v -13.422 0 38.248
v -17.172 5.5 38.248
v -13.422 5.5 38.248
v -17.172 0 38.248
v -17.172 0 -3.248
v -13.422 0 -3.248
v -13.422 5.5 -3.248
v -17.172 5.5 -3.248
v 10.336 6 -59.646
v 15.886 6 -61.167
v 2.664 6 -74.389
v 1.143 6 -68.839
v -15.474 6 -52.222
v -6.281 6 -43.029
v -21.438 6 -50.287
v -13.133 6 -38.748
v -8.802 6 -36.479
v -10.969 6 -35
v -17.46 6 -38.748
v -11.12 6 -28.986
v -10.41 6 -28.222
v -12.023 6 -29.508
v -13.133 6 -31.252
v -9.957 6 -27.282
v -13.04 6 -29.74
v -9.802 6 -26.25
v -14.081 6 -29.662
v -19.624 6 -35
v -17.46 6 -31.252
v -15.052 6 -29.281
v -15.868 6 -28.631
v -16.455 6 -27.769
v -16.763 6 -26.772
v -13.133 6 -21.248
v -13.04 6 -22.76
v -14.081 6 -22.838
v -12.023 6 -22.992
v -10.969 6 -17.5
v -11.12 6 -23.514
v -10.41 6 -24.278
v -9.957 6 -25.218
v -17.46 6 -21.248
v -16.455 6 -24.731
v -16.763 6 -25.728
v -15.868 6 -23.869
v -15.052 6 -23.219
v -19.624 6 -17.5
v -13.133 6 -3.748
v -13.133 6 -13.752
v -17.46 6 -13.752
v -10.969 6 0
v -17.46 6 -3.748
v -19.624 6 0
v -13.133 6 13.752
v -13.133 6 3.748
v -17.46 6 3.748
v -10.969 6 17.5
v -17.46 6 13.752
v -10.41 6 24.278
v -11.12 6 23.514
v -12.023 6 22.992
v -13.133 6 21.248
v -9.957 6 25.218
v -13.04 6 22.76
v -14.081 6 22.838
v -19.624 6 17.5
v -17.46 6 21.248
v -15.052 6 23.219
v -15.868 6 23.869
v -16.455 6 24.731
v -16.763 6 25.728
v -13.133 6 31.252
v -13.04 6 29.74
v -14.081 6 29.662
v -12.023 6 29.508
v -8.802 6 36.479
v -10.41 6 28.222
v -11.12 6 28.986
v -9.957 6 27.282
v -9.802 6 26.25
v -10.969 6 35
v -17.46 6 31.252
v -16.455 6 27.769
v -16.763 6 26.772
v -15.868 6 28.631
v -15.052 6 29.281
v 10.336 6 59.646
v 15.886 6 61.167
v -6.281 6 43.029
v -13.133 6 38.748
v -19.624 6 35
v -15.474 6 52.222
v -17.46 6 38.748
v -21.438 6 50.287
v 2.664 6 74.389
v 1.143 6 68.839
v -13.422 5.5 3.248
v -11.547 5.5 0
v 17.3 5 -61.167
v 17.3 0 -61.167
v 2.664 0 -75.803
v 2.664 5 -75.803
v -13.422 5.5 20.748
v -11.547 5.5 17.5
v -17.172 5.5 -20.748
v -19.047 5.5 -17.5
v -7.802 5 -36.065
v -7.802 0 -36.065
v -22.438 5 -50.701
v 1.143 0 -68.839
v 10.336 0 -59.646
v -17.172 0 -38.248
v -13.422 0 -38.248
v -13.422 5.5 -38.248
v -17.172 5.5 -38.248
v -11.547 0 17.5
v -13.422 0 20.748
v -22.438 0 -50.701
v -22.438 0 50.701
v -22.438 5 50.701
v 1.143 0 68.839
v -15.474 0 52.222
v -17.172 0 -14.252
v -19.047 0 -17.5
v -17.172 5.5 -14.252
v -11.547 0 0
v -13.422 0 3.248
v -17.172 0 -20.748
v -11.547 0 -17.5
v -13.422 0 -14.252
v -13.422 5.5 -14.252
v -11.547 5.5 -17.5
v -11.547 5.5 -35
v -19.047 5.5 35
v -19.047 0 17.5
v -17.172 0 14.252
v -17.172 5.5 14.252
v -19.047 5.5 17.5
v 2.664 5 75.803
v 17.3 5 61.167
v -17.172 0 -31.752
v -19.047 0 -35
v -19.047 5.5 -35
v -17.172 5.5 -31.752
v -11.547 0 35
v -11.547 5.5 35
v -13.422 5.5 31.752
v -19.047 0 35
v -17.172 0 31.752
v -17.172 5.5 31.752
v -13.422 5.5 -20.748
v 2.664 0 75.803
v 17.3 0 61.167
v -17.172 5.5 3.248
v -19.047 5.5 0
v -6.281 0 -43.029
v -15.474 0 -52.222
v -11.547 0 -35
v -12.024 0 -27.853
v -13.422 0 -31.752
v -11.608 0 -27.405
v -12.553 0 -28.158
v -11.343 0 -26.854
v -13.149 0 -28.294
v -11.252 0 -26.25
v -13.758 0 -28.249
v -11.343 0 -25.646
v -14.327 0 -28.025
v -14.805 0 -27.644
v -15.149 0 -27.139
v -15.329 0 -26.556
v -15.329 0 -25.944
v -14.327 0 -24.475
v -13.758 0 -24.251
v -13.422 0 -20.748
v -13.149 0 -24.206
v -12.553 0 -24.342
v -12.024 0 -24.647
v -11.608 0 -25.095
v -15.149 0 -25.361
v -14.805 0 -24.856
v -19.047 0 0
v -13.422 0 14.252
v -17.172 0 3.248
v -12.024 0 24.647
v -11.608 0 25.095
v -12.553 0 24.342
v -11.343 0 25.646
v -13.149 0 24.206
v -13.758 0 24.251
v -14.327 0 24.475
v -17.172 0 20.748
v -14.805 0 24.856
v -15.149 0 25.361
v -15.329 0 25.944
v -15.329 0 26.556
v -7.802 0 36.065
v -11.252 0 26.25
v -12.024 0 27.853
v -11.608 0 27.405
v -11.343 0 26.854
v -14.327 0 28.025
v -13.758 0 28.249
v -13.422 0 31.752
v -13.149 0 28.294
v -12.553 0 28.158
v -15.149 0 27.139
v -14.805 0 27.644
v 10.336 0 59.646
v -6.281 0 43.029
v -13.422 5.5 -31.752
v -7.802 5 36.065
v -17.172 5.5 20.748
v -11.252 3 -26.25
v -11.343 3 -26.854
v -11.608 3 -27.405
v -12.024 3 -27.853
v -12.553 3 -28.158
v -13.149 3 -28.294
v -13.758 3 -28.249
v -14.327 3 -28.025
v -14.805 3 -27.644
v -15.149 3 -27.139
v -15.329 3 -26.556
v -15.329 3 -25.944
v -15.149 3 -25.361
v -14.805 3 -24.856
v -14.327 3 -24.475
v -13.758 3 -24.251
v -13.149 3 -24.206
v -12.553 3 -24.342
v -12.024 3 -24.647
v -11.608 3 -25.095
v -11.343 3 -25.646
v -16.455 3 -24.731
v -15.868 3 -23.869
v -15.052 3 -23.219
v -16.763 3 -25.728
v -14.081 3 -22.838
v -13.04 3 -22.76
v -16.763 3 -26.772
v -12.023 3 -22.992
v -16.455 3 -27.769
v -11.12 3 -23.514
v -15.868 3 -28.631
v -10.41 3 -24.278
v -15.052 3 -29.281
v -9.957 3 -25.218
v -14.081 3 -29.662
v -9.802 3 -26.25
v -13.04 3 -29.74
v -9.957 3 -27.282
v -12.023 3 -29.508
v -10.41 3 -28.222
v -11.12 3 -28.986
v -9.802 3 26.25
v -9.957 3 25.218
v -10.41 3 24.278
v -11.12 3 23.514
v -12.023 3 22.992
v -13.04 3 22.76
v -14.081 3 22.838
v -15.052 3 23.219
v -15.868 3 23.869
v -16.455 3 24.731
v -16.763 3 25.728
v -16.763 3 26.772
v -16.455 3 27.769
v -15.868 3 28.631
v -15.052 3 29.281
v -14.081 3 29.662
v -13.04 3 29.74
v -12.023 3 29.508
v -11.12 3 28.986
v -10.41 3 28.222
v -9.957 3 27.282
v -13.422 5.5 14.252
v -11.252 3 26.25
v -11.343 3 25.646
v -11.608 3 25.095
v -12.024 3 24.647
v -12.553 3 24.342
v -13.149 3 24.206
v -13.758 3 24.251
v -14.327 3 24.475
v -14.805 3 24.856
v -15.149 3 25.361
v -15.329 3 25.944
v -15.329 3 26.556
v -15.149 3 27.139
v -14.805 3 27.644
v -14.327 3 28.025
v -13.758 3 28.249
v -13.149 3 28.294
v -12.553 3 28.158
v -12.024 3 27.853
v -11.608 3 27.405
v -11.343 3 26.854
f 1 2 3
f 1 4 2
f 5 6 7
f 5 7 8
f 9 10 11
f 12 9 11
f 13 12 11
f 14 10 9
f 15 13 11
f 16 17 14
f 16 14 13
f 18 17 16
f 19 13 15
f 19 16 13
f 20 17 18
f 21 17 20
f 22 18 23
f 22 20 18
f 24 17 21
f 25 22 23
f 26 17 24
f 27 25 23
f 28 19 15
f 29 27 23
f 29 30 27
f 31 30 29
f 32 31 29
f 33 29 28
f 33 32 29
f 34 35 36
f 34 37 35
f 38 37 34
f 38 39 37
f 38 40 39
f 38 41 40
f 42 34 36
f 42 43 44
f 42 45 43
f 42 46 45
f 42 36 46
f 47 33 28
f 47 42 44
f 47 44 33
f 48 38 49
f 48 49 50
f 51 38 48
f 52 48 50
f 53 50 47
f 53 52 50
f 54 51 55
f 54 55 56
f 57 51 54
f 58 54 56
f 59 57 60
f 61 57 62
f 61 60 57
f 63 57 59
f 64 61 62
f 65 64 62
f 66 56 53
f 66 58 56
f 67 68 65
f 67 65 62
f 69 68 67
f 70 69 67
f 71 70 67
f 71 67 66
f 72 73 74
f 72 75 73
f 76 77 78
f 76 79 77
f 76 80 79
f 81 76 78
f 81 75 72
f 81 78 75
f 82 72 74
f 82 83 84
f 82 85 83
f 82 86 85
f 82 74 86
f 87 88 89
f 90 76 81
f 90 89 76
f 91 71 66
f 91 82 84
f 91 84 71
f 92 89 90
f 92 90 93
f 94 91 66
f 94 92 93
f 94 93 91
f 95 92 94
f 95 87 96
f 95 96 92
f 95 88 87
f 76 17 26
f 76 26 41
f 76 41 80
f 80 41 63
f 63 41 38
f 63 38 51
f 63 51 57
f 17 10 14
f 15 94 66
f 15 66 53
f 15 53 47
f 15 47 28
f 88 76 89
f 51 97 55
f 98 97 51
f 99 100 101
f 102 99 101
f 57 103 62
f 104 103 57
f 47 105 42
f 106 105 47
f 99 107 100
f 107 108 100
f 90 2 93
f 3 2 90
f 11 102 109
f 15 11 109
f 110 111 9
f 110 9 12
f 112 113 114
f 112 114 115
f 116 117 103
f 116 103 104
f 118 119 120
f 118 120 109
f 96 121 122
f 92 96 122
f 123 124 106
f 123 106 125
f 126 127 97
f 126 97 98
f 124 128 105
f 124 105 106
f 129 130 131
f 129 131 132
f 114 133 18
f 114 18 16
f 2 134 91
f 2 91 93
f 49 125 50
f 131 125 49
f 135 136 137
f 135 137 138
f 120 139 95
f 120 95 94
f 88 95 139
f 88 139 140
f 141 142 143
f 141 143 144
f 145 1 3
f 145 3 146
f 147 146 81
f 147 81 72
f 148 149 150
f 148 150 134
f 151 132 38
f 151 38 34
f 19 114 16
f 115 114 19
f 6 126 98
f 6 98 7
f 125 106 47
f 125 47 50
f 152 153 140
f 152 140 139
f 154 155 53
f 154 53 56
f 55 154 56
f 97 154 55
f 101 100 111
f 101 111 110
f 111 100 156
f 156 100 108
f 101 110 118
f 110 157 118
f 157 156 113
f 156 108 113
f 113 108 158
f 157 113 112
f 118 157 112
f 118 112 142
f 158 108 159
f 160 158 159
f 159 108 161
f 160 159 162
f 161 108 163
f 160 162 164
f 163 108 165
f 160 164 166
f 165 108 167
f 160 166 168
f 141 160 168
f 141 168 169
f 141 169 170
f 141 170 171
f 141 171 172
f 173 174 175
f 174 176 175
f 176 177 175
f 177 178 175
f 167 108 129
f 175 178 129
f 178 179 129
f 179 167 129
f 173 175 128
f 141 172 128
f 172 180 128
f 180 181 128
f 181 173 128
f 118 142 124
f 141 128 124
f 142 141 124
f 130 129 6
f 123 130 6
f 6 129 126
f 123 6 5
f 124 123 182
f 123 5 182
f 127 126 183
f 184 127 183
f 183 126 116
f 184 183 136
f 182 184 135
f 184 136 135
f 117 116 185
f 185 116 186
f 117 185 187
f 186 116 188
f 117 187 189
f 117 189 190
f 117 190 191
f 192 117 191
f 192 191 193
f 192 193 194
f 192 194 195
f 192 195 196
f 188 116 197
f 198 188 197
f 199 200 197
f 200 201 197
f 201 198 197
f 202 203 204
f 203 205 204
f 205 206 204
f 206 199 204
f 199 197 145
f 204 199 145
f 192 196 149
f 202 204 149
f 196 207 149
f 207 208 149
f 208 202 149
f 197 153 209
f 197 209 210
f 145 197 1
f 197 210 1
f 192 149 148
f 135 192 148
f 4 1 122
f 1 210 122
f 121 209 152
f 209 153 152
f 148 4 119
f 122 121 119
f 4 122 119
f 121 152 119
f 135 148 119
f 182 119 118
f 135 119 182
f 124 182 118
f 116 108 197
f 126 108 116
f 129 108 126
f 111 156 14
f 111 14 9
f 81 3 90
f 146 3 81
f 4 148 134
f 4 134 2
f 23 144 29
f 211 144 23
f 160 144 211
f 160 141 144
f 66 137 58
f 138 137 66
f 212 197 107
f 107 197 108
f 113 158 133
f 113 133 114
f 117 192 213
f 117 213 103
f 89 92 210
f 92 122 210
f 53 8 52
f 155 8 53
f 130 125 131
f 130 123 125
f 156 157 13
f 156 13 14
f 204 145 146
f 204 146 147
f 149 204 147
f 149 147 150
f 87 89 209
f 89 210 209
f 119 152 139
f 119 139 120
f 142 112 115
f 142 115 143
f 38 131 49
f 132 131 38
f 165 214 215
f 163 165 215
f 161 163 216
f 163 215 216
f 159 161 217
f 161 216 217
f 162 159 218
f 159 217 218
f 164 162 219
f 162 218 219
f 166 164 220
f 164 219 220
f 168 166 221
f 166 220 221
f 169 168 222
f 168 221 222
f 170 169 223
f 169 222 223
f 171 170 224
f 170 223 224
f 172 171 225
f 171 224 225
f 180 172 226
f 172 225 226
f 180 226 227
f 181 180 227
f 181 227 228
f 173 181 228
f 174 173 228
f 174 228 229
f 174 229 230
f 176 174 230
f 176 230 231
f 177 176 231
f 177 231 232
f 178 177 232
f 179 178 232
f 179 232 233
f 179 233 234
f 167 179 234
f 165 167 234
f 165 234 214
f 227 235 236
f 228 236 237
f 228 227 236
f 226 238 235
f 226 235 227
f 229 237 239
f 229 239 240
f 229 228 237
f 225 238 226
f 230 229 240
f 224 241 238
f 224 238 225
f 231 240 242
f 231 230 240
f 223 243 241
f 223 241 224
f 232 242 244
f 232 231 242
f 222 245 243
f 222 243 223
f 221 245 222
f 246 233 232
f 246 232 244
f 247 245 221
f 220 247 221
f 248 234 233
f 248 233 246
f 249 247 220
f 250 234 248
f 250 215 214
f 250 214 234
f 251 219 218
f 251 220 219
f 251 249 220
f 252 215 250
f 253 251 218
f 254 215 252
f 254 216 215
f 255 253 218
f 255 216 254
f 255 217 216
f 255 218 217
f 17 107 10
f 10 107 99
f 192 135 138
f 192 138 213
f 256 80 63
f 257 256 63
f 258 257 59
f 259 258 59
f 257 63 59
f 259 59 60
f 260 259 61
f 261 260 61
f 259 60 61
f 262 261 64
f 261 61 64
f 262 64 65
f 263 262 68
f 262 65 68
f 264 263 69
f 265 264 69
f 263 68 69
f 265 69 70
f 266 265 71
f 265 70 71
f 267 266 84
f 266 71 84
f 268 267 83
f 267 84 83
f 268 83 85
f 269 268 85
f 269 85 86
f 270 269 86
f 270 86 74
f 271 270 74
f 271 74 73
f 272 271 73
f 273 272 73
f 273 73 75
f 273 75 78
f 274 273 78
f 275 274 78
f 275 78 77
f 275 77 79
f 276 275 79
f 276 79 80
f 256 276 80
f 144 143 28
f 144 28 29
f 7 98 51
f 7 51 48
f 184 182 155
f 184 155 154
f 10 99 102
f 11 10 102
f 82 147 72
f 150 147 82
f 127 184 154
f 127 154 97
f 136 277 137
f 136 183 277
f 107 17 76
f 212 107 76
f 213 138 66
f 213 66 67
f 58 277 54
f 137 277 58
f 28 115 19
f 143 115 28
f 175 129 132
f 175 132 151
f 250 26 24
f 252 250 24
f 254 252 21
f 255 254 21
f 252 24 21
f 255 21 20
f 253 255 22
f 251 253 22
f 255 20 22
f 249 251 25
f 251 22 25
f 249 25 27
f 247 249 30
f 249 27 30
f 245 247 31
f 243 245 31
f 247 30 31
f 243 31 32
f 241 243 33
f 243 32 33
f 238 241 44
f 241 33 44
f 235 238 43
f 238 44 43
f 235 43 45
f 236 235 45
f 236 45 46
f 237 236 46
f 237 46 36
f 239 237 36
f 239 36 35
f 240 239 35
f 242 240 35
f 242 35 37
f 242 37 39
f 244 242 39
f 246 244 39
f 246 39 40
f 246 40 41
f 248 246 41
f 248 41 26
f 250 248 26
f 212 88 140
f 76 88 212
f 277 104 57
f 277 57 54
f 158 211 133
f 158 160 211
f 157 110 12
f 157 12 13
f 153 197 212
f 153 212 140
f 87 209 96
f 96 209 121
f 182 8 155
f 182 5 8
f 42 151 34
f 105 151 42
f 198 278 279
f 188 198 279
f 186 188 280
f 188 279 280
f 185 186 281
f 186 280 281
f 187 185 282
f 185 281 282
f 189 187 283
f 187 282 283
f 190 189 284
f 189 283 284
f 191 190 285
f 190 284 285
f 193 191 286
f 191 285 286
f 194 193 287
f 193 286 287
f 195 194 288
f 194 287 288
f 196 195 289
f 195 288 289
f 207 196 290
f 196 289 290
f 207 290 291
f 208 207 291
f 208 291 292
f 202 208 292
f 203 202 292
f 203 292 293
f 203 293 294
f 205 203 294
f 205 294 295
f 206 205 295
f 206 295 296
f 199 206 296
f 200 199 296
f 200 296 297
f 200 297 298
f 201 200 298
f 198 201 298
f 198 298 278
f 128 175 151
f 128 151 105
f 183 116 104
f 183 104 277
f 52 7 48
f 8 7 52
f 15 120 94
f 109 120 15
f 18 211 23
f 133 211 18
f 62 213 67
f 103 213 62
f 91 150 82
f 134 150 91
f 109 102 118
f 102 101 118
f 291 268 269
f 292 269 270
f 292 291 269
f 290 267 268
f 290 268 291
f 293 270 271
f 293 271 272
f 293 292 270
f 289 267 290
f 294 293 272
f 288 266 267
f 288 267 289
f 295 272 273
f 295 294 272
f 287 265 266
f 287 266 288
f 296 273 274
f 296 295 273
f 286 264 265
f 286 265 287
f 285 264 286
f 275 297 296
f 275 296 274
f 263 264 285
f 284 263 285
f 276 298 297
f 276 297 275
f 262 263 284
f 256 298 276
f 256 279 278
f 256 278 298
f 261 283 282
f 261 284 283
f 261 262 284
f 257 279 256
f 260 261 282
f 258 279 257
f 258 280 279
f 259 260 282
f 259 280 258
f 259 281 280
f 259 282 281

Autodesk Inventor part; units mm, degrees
ref_plane "YZ Plane" through (0, 0, 0) normal (1, 0, 0) x (0, 1, 0)
ref_plane "XZ Plane" through (0, 0, 0) normal (0, 1, 0) x (-1, 0, 0)
ref_plane "XY Plane" through (0, 0, 0) normal (0, 0, 1) x (1, 0, 0)
sketch "Sketch1" plane through (0, 0, 0) normal (0, 1, 0) x (-1, 0, 0)
  line L0 (0, 0) -> (-29.0466, 0)
  line L1 (0, 58.5031) -> (-5.7395, 64.2426)
  line L2 (6.2813, 43.0294) -> (-10.3357, 59.6464)
  line L3 (-10.3357, 59.6464) -> (-1.1433, 68.8388)
  line L4 (-1.1433, 68.8388) -> (15.4737, 52.2218)
  line L5 (15.4737, 52.2218) -> (6.2813, 43.0294)
  line L6 (6.2813, 43.0294) -> (-1.1433, 68.8388) construction
  line L7 (-10.3357, 59.6464) -> (15.4737, 52.2218) construction
  line L8 (7.802, 36.0648) -> (-17.3003, 61.1671)
  line L9 (-17.3003, 61.1671) -> (-2.664, 75.8034)
  line L10 (-2.664, 75.8034) -> (22.4383, 50.7011)
  line L11 (22.4383, 50.7011) -> (7.802, 36.0648)
  line L12 (7.802, 36.0648) -> (-2.664, 75.8034) construction
  line L13 (-17.3003, 61.1671) -> (22.4383, 50.7011) construction
  line L14 (7.802, 36.0648) -> (7.802, -0.7306)
  line L15 (22.4383, 50.7011) -> (22.4383, -0.4008)
  line L16 (6.2813, -43.0294) -> (-10.3357, -59.6464)
  line L17 (-10.3357, -59.6464) -> (-1.1433, -68.8388)
  line L18 (-1.1433, -68.8388) -> (15.4737, -52.2218)
  line L19 (15.4737, -52.2218) -> (6.2813, -43.0294)
  line L20 (-10.3357, -59.6464) -> (15.4737, -52.2218) construction
  line L21 (7.802, -36.0648) -> (-17.3003, -61.1671)
  line L22 (-17.3003, -61.1671) -> (-2.664, -75.8034)
  line L23 (-2.664, -75.8034) -> (22.4383, -50.7011)
  line L24 (22.4383, -50.7011) -> (7.802, -36.0648)
  line L25 (7.802, -36.0648) -> (-2.664, -75.8034) construction
  line L26 (7.802, -36.0648) -> (7.802, -0.7306)
  line L27 (22.4383, -50.7011) -> (22.4383, -0.4008)
  point P0 (2.569, 55.9341)
  point P1 (-1.4969, 60)
  dimension "d0" = 45
  dimension "d1" = 6
  dimension "d2" = 23.5
  dimension "d3" = 13
  dimension "d4" = 60
  dimension "d6" = 6
extrude "Extrusion1" add sketch "Sketch1" along normal blind 6
sketch "Sketch3" plane through (0, 0, 0) normal (0, -1, 0) x (1, 0, 0)
  line L0 (-9.3663, 0) -> (-22.4383, 0)
  line L1 (-22.4383, -50.7011) -> (-22.4383, 50.7011) projected
  circle A0 centre (-15.2967, -35) radius 3.75
  circle A1 centre (-15.2967, 0) radius 3.75
  circle A2 centre (-15.2967, -17.5) radius 3.75
  circle A3 centre (-15.2967, 35) radius 3.75
  line L2 (-19.0467, -35) -> (-17.1717, -31.7524)
  line L3 (-17.1717, -31.7524) -> (-13.4217, -31.7524)
  line L4 (-13.4217, -31.7524) -> (-11.5467, -35)
  line L5 (-11.5467, -35) -> (-13.4217, -38.2476)
  line L6 (-13.4217, -38.2476) -> (-17.1717, -38.2476)
  line L7 (-17.1717, -38.2476) -> (-19.0467, -35)
  line L8 (-19.0467, -17.5) -> (-17.1717, -14.2524)
  line L9 (-17.1717, -14.2524) -> (-13.4217, -14.2524)
  line L10 (-13.4217, -14.2524) -> (-11.5467, -17.5)
  line L11 (-11.5467, -17.5) -> (-13.4217, -20.7476)
  line L12 (-13.4217, -20.7476) -> (-17.1717, -20.7476)
  line L13 (-17.1717, -20.7476) -> (-19.0467, -17.5)
  line L14 (-19.0467, 0) -> (-17.1717, 3.2476)
  line L15 (-17.1717, 3.2476) -> (-13.4217, 3.2476)
  line L16 (-13.4217, 3.2476) -> (-11.5467, 0)
  line L17 (-11.5467, 0) -> (-13.4217, -3.2476)
  line L18 (-13.4217, -3.2476) -> (-17.1717, -3.2476)
  line L19 (-17.1717, -3.2476) -> (-19.0467, 0)
  line L20 (-19.0467, 35) -> (-17.1717, 38.2476)
  line L21 (-17.1717, 38.2476) -> (-13.4217, 38.2476)
  line L22 (-13.4217, 38.2476) -> (-11.5467, 35)
  line L23 (-11.5467, 35) -> (-13.4217, 31.7524)
  line L24 (-13.4217, 31.7524) -> (-17.1717, 31.7524)
  line L25 (-17.1717, 31.7524) -> (-19.0467, 35)
  circle A4 centre (-15.2967, 17.5) radius 3.75
  line L26 (-19.0467, 17.5) -> (-17.1717, 20.7476)
  line L27 (-17.1717, 20.7476) -> (-13.4217, 20.7476)
  line L28 (-13.4217, 20.7476) -> (-11.5467, 17.5)
  line L29 (-11.5467, 17.5) -> (-13.4217, 14.2524)
  line L30 (-13.4217, 14.2524) -> (-17.1717, 14.2524)
  line L31 (-17.1717, 14.2524) -> (-19.0467, 17.5)
  point P0 (0, 0)
  dimension "d15" = 7.5
  dimension "d16" = 7.5
  dimension "d17" = 7.5
  dimension "d19" = 7.5
  dimension "d20" = 7.5
extrude "Extrusion3" cut sketch "Sketch3" against normal blind 6 contours L17 L18 L19 L0 | L0 L14 L15 L16 | L5 L6 L7 L2 L3 L4 | L11 L12 L13 L8 L9 L10 | L23 L24 L25 L20 L21 L22 | L29 L30 L31 L26 L27 L28
sketch "Sketch5" plane through (0, 6, 0) normal (0, 1, 0) x (1, 0, 0)
  line L0 (-17.1717, -3.2476) -> (-19.0467, 0) projected
  line L1 (-19.0467, 0) -> (-17.1717, 3.2476) projected
  line L2 (-17.1717, 3.2476) -> (-13.4217, 3.2476) projected
  line L3 (-13.4217, 3.2476) -> (-11.5467, 0) projected
  line L4 (-11.5467, 0) -> (-13.4217, -3.2476) projected
  line L5 (-13.4217, -3.2476) -> (-17.1717, -3.2476) projected
  line L6 (-13.4217, 20.7476) -> (-11.5467, 17.5) projected
  line L7 (-11.5467, 17.5) -> (-13.4217, 14.2524) projected
  line L8 (-13.4217, 14.2524) -> (-17.1717, 14.2524) projected
  line L9 (-17.1717, 14.2524) -> (-19.0467, 17.5) projected
  line L10 (-19.0467, 17.5) -> (-17.1717, 20.7476) projected
  line L11 (-17.1717, 20.7476) -> (-13.4217, 20.7476) projected
  line L12 (-13.4217, -31.7524) -> (-11.5467, -35) projected
  line L13 (-11.5467, -35) -> (-13.4217, -38.2476) projected
  line L14 (-13.4217, -38.2476) -> (-17.1717, -38.2476) projected
  line L15 (-17.1717, -38.2476) -> (-19.0467, -35) projected
  line L16 (-19.0467, -35) -> (-17.1717, -31.7524) projected
  line L17 (-17.1717, -31.7524) -> (-13.4217, -31.7524) projected
  line L18 (-13.4217, 38.2476) -> (-11.5467, 35) projected
  line L19 (-11.5467, 35) -> (-13.4217, 31.7524) projected
  line L20 (-13.4217, 31.7524) -> (-17.1717, 31.7524) projected
  line L21 (-17.1717, 31.7524) -> (-19.0467, 35) projected
  line L22 (-19.0467, 35) -> (-17.1717, 38.2476) projected
  line L23 (-17.1717, 38.2476) -> (-13.4217, 38.2476) projected
  line L24 (-13.4217, -14.2524) -> (-11.5467, -17.5) projected
  line L25 (-11.5467, -17.5) -> (-13.4217, -20.7476) projected
  line L26 (-13.4217, -20.7476) -> (-17.1717, -20.7476) projected
  line L27 (-17.1717, -20.7476) -> (-19.0467, -17.5) projected
  line L28 (-19.0467, -17.5) -> (-17.1717, -14.2524) projected
  line L29 (-17.1717, -14.2524) -> (-13.4217, -14.2524) projected
  line L30 (-7.802, -36.0648) -> (-7.802, 36.0648) projected
  line L31 (-7.802, 36.0648) -> (17.3003, 61.1671) projected
  line L32 (17.3003, 61.1671) -> (2.664, 75.8034) projected
  line L33 (2.664, 75.8034) -> (-22.4383, 50.7011) projected
  line L34 (-22.4383, 50.7011) -> (-22.4383, -50.7011) projected
  line L35 (-22.4383, -50.7011) -> (2.664, -75.8034) projected
  line L36 (2.664, -75.8034) -> (17.3003, -61.1671) projected
  line L37 (17.3003, -61.1671) -> (-7.802, -36.0648) projected
  line L38 (1.1433, 68.8388) -> (10.3357, 59.6464) projected
  line L39 (10.3357, 59.6464) -> (-6.2813, 43.0294) projected
  line L40 (-6.2813, 43.0294) -> (-15.4737, 52.2218) projected
  line L41 (-15.4737, 52.2218) -> (1.1433, 68.8388) projected
  line L42 (1.1433, -68.8388) -> (-15.4737, -52.2218) projected
  line L43 (-15.4737, -52.2218) -> (-6.2813, -43.0294) projected
  line L44 (-6.2813, -43.0294) -> (10.3357, -59.6464) projected
  line L45 (10.3357, -59.6464) -> (1.1433, -68.8388) projected
  line L46 (-13.4217, -31.7524) -> (-11.5467, -35) projected
  line L47 (-11.5467, -35) -> (-7.802, -35)
  line L48 (-7.802, -36.0648) -> (-7.802, 36.0648) projected
  line L49 (-11.5467, -17.5) -> (-7.802, -17.5)
  line L50 (-11.5467, 17.5) -> (-7.802, 17.5)
  line L51 (-13.4217, 31.7524) -> (-11.5467, 35) projected
  line L52 (-11.5467, 35) -> (-7.802, 35)
  line L53 (-7.802, -26.25) -> (-16.5311, -26.25)
  line L54 (-7.802, 26.25) -> (-17.8697, 26.25)
  circle A0 centre (-13.302, -26.25) radius 2.05
  circle A1 centre (-13.302, 26.25) radius 2.05
  point P0 (0, 0)
  dimension "d34" = 8.75
  dimension "d35" = 8.75
  dimension "d38" = 4.1
  dimension "d39" = 5.5
  dimension "d40" = 4.1
  dimension "d41" = 5.5
extrude "Extrusion4" cut sketch "Sketch5" against normal blind 10 contours A1 L54 | L54 A1 | A0 L53 | L53 A0
chamfer "Chamfer1" distance 1 angle 45 8 edges at (-7.802, 6, 0) (-22.4383, 6, 0) (4.7492, 6, 48.616) (9.9822, 6, 68.4853) (-9.8871, 6, 63.2523) (4.7492, 6, -48.616) (-9.8871, 6, -63.2523) (9.9822, 6, -68.4853)
chamfer "Chamfer2" distance 0.5 angle 45 30 edges at (-15.2967, 6, 3.2476) (-18.1092, 6, 1.6238) (-18.1092, 6, -1.6238) (-15.2967, 6, -3.2476) (-12.4842, 6, -1.6238) (-12.4842, 6, 1.6238) (-15.2967, 6, -14.2524) (-18.1092, 6, -15.8762) (-18.1092, 6, -19.1238) (-15.2967, 6, -20.7476) (-12.4842, 6, -19.1238) (-12.4842, 6, -15.8762) (-18.1092, 6, -33.3762) (-18.1092, 6, -36.6238) (-15.2967, 6, -38.2476) (-12.4842, 6, -36.6238) (-12.4842, 6, -33.3762) (-15.2967, 6, -31.7524) (-15.2967, 6, 14.2524) (-18.1092, 6, 15.8762) (-18.1092, 6, 19.1238) (-15.2967, 6, 20.7476) (-12.4842, 6, 19.1238) (-12.4842, 6, 15.8762) (-15.2967, 6, 31.7524) (-18.1092, 6, 33.3762) (-18.1092, 6, 36.6238) (-15.2967, 6, 38.2476) (-12.4842, 6, 36.6238) (-12.4842, 6, 33.3762)
sketch "Sketch6" plane through (0, 6, 0) normal (0, 1, 0) x (1, 0, 0)
  circle A0 centre (-13.302, -26.25) radius 2.05 projected
  circle A1 centre (-13.302, -26.25) radius 3.5
  circle A2 centre (-13.302, 26.25) radius 2.05 projected
  circle A3 centre (-13.302, 26.25) radius 3.5
  point P0 (0, 0)
  dimension "d50" = 7
  dimension "d51" = 7
extrude "Extrusion5" cut sketch "Sketch6" against normal blind 3
equation "\"d15\" = d17"
equation "\"d16\" = d17"
equation "\"d19\" = d17"
equation "\"d20\" = d17"
equation "\"d51\" = d50"
properties part number "Side_Frame"
